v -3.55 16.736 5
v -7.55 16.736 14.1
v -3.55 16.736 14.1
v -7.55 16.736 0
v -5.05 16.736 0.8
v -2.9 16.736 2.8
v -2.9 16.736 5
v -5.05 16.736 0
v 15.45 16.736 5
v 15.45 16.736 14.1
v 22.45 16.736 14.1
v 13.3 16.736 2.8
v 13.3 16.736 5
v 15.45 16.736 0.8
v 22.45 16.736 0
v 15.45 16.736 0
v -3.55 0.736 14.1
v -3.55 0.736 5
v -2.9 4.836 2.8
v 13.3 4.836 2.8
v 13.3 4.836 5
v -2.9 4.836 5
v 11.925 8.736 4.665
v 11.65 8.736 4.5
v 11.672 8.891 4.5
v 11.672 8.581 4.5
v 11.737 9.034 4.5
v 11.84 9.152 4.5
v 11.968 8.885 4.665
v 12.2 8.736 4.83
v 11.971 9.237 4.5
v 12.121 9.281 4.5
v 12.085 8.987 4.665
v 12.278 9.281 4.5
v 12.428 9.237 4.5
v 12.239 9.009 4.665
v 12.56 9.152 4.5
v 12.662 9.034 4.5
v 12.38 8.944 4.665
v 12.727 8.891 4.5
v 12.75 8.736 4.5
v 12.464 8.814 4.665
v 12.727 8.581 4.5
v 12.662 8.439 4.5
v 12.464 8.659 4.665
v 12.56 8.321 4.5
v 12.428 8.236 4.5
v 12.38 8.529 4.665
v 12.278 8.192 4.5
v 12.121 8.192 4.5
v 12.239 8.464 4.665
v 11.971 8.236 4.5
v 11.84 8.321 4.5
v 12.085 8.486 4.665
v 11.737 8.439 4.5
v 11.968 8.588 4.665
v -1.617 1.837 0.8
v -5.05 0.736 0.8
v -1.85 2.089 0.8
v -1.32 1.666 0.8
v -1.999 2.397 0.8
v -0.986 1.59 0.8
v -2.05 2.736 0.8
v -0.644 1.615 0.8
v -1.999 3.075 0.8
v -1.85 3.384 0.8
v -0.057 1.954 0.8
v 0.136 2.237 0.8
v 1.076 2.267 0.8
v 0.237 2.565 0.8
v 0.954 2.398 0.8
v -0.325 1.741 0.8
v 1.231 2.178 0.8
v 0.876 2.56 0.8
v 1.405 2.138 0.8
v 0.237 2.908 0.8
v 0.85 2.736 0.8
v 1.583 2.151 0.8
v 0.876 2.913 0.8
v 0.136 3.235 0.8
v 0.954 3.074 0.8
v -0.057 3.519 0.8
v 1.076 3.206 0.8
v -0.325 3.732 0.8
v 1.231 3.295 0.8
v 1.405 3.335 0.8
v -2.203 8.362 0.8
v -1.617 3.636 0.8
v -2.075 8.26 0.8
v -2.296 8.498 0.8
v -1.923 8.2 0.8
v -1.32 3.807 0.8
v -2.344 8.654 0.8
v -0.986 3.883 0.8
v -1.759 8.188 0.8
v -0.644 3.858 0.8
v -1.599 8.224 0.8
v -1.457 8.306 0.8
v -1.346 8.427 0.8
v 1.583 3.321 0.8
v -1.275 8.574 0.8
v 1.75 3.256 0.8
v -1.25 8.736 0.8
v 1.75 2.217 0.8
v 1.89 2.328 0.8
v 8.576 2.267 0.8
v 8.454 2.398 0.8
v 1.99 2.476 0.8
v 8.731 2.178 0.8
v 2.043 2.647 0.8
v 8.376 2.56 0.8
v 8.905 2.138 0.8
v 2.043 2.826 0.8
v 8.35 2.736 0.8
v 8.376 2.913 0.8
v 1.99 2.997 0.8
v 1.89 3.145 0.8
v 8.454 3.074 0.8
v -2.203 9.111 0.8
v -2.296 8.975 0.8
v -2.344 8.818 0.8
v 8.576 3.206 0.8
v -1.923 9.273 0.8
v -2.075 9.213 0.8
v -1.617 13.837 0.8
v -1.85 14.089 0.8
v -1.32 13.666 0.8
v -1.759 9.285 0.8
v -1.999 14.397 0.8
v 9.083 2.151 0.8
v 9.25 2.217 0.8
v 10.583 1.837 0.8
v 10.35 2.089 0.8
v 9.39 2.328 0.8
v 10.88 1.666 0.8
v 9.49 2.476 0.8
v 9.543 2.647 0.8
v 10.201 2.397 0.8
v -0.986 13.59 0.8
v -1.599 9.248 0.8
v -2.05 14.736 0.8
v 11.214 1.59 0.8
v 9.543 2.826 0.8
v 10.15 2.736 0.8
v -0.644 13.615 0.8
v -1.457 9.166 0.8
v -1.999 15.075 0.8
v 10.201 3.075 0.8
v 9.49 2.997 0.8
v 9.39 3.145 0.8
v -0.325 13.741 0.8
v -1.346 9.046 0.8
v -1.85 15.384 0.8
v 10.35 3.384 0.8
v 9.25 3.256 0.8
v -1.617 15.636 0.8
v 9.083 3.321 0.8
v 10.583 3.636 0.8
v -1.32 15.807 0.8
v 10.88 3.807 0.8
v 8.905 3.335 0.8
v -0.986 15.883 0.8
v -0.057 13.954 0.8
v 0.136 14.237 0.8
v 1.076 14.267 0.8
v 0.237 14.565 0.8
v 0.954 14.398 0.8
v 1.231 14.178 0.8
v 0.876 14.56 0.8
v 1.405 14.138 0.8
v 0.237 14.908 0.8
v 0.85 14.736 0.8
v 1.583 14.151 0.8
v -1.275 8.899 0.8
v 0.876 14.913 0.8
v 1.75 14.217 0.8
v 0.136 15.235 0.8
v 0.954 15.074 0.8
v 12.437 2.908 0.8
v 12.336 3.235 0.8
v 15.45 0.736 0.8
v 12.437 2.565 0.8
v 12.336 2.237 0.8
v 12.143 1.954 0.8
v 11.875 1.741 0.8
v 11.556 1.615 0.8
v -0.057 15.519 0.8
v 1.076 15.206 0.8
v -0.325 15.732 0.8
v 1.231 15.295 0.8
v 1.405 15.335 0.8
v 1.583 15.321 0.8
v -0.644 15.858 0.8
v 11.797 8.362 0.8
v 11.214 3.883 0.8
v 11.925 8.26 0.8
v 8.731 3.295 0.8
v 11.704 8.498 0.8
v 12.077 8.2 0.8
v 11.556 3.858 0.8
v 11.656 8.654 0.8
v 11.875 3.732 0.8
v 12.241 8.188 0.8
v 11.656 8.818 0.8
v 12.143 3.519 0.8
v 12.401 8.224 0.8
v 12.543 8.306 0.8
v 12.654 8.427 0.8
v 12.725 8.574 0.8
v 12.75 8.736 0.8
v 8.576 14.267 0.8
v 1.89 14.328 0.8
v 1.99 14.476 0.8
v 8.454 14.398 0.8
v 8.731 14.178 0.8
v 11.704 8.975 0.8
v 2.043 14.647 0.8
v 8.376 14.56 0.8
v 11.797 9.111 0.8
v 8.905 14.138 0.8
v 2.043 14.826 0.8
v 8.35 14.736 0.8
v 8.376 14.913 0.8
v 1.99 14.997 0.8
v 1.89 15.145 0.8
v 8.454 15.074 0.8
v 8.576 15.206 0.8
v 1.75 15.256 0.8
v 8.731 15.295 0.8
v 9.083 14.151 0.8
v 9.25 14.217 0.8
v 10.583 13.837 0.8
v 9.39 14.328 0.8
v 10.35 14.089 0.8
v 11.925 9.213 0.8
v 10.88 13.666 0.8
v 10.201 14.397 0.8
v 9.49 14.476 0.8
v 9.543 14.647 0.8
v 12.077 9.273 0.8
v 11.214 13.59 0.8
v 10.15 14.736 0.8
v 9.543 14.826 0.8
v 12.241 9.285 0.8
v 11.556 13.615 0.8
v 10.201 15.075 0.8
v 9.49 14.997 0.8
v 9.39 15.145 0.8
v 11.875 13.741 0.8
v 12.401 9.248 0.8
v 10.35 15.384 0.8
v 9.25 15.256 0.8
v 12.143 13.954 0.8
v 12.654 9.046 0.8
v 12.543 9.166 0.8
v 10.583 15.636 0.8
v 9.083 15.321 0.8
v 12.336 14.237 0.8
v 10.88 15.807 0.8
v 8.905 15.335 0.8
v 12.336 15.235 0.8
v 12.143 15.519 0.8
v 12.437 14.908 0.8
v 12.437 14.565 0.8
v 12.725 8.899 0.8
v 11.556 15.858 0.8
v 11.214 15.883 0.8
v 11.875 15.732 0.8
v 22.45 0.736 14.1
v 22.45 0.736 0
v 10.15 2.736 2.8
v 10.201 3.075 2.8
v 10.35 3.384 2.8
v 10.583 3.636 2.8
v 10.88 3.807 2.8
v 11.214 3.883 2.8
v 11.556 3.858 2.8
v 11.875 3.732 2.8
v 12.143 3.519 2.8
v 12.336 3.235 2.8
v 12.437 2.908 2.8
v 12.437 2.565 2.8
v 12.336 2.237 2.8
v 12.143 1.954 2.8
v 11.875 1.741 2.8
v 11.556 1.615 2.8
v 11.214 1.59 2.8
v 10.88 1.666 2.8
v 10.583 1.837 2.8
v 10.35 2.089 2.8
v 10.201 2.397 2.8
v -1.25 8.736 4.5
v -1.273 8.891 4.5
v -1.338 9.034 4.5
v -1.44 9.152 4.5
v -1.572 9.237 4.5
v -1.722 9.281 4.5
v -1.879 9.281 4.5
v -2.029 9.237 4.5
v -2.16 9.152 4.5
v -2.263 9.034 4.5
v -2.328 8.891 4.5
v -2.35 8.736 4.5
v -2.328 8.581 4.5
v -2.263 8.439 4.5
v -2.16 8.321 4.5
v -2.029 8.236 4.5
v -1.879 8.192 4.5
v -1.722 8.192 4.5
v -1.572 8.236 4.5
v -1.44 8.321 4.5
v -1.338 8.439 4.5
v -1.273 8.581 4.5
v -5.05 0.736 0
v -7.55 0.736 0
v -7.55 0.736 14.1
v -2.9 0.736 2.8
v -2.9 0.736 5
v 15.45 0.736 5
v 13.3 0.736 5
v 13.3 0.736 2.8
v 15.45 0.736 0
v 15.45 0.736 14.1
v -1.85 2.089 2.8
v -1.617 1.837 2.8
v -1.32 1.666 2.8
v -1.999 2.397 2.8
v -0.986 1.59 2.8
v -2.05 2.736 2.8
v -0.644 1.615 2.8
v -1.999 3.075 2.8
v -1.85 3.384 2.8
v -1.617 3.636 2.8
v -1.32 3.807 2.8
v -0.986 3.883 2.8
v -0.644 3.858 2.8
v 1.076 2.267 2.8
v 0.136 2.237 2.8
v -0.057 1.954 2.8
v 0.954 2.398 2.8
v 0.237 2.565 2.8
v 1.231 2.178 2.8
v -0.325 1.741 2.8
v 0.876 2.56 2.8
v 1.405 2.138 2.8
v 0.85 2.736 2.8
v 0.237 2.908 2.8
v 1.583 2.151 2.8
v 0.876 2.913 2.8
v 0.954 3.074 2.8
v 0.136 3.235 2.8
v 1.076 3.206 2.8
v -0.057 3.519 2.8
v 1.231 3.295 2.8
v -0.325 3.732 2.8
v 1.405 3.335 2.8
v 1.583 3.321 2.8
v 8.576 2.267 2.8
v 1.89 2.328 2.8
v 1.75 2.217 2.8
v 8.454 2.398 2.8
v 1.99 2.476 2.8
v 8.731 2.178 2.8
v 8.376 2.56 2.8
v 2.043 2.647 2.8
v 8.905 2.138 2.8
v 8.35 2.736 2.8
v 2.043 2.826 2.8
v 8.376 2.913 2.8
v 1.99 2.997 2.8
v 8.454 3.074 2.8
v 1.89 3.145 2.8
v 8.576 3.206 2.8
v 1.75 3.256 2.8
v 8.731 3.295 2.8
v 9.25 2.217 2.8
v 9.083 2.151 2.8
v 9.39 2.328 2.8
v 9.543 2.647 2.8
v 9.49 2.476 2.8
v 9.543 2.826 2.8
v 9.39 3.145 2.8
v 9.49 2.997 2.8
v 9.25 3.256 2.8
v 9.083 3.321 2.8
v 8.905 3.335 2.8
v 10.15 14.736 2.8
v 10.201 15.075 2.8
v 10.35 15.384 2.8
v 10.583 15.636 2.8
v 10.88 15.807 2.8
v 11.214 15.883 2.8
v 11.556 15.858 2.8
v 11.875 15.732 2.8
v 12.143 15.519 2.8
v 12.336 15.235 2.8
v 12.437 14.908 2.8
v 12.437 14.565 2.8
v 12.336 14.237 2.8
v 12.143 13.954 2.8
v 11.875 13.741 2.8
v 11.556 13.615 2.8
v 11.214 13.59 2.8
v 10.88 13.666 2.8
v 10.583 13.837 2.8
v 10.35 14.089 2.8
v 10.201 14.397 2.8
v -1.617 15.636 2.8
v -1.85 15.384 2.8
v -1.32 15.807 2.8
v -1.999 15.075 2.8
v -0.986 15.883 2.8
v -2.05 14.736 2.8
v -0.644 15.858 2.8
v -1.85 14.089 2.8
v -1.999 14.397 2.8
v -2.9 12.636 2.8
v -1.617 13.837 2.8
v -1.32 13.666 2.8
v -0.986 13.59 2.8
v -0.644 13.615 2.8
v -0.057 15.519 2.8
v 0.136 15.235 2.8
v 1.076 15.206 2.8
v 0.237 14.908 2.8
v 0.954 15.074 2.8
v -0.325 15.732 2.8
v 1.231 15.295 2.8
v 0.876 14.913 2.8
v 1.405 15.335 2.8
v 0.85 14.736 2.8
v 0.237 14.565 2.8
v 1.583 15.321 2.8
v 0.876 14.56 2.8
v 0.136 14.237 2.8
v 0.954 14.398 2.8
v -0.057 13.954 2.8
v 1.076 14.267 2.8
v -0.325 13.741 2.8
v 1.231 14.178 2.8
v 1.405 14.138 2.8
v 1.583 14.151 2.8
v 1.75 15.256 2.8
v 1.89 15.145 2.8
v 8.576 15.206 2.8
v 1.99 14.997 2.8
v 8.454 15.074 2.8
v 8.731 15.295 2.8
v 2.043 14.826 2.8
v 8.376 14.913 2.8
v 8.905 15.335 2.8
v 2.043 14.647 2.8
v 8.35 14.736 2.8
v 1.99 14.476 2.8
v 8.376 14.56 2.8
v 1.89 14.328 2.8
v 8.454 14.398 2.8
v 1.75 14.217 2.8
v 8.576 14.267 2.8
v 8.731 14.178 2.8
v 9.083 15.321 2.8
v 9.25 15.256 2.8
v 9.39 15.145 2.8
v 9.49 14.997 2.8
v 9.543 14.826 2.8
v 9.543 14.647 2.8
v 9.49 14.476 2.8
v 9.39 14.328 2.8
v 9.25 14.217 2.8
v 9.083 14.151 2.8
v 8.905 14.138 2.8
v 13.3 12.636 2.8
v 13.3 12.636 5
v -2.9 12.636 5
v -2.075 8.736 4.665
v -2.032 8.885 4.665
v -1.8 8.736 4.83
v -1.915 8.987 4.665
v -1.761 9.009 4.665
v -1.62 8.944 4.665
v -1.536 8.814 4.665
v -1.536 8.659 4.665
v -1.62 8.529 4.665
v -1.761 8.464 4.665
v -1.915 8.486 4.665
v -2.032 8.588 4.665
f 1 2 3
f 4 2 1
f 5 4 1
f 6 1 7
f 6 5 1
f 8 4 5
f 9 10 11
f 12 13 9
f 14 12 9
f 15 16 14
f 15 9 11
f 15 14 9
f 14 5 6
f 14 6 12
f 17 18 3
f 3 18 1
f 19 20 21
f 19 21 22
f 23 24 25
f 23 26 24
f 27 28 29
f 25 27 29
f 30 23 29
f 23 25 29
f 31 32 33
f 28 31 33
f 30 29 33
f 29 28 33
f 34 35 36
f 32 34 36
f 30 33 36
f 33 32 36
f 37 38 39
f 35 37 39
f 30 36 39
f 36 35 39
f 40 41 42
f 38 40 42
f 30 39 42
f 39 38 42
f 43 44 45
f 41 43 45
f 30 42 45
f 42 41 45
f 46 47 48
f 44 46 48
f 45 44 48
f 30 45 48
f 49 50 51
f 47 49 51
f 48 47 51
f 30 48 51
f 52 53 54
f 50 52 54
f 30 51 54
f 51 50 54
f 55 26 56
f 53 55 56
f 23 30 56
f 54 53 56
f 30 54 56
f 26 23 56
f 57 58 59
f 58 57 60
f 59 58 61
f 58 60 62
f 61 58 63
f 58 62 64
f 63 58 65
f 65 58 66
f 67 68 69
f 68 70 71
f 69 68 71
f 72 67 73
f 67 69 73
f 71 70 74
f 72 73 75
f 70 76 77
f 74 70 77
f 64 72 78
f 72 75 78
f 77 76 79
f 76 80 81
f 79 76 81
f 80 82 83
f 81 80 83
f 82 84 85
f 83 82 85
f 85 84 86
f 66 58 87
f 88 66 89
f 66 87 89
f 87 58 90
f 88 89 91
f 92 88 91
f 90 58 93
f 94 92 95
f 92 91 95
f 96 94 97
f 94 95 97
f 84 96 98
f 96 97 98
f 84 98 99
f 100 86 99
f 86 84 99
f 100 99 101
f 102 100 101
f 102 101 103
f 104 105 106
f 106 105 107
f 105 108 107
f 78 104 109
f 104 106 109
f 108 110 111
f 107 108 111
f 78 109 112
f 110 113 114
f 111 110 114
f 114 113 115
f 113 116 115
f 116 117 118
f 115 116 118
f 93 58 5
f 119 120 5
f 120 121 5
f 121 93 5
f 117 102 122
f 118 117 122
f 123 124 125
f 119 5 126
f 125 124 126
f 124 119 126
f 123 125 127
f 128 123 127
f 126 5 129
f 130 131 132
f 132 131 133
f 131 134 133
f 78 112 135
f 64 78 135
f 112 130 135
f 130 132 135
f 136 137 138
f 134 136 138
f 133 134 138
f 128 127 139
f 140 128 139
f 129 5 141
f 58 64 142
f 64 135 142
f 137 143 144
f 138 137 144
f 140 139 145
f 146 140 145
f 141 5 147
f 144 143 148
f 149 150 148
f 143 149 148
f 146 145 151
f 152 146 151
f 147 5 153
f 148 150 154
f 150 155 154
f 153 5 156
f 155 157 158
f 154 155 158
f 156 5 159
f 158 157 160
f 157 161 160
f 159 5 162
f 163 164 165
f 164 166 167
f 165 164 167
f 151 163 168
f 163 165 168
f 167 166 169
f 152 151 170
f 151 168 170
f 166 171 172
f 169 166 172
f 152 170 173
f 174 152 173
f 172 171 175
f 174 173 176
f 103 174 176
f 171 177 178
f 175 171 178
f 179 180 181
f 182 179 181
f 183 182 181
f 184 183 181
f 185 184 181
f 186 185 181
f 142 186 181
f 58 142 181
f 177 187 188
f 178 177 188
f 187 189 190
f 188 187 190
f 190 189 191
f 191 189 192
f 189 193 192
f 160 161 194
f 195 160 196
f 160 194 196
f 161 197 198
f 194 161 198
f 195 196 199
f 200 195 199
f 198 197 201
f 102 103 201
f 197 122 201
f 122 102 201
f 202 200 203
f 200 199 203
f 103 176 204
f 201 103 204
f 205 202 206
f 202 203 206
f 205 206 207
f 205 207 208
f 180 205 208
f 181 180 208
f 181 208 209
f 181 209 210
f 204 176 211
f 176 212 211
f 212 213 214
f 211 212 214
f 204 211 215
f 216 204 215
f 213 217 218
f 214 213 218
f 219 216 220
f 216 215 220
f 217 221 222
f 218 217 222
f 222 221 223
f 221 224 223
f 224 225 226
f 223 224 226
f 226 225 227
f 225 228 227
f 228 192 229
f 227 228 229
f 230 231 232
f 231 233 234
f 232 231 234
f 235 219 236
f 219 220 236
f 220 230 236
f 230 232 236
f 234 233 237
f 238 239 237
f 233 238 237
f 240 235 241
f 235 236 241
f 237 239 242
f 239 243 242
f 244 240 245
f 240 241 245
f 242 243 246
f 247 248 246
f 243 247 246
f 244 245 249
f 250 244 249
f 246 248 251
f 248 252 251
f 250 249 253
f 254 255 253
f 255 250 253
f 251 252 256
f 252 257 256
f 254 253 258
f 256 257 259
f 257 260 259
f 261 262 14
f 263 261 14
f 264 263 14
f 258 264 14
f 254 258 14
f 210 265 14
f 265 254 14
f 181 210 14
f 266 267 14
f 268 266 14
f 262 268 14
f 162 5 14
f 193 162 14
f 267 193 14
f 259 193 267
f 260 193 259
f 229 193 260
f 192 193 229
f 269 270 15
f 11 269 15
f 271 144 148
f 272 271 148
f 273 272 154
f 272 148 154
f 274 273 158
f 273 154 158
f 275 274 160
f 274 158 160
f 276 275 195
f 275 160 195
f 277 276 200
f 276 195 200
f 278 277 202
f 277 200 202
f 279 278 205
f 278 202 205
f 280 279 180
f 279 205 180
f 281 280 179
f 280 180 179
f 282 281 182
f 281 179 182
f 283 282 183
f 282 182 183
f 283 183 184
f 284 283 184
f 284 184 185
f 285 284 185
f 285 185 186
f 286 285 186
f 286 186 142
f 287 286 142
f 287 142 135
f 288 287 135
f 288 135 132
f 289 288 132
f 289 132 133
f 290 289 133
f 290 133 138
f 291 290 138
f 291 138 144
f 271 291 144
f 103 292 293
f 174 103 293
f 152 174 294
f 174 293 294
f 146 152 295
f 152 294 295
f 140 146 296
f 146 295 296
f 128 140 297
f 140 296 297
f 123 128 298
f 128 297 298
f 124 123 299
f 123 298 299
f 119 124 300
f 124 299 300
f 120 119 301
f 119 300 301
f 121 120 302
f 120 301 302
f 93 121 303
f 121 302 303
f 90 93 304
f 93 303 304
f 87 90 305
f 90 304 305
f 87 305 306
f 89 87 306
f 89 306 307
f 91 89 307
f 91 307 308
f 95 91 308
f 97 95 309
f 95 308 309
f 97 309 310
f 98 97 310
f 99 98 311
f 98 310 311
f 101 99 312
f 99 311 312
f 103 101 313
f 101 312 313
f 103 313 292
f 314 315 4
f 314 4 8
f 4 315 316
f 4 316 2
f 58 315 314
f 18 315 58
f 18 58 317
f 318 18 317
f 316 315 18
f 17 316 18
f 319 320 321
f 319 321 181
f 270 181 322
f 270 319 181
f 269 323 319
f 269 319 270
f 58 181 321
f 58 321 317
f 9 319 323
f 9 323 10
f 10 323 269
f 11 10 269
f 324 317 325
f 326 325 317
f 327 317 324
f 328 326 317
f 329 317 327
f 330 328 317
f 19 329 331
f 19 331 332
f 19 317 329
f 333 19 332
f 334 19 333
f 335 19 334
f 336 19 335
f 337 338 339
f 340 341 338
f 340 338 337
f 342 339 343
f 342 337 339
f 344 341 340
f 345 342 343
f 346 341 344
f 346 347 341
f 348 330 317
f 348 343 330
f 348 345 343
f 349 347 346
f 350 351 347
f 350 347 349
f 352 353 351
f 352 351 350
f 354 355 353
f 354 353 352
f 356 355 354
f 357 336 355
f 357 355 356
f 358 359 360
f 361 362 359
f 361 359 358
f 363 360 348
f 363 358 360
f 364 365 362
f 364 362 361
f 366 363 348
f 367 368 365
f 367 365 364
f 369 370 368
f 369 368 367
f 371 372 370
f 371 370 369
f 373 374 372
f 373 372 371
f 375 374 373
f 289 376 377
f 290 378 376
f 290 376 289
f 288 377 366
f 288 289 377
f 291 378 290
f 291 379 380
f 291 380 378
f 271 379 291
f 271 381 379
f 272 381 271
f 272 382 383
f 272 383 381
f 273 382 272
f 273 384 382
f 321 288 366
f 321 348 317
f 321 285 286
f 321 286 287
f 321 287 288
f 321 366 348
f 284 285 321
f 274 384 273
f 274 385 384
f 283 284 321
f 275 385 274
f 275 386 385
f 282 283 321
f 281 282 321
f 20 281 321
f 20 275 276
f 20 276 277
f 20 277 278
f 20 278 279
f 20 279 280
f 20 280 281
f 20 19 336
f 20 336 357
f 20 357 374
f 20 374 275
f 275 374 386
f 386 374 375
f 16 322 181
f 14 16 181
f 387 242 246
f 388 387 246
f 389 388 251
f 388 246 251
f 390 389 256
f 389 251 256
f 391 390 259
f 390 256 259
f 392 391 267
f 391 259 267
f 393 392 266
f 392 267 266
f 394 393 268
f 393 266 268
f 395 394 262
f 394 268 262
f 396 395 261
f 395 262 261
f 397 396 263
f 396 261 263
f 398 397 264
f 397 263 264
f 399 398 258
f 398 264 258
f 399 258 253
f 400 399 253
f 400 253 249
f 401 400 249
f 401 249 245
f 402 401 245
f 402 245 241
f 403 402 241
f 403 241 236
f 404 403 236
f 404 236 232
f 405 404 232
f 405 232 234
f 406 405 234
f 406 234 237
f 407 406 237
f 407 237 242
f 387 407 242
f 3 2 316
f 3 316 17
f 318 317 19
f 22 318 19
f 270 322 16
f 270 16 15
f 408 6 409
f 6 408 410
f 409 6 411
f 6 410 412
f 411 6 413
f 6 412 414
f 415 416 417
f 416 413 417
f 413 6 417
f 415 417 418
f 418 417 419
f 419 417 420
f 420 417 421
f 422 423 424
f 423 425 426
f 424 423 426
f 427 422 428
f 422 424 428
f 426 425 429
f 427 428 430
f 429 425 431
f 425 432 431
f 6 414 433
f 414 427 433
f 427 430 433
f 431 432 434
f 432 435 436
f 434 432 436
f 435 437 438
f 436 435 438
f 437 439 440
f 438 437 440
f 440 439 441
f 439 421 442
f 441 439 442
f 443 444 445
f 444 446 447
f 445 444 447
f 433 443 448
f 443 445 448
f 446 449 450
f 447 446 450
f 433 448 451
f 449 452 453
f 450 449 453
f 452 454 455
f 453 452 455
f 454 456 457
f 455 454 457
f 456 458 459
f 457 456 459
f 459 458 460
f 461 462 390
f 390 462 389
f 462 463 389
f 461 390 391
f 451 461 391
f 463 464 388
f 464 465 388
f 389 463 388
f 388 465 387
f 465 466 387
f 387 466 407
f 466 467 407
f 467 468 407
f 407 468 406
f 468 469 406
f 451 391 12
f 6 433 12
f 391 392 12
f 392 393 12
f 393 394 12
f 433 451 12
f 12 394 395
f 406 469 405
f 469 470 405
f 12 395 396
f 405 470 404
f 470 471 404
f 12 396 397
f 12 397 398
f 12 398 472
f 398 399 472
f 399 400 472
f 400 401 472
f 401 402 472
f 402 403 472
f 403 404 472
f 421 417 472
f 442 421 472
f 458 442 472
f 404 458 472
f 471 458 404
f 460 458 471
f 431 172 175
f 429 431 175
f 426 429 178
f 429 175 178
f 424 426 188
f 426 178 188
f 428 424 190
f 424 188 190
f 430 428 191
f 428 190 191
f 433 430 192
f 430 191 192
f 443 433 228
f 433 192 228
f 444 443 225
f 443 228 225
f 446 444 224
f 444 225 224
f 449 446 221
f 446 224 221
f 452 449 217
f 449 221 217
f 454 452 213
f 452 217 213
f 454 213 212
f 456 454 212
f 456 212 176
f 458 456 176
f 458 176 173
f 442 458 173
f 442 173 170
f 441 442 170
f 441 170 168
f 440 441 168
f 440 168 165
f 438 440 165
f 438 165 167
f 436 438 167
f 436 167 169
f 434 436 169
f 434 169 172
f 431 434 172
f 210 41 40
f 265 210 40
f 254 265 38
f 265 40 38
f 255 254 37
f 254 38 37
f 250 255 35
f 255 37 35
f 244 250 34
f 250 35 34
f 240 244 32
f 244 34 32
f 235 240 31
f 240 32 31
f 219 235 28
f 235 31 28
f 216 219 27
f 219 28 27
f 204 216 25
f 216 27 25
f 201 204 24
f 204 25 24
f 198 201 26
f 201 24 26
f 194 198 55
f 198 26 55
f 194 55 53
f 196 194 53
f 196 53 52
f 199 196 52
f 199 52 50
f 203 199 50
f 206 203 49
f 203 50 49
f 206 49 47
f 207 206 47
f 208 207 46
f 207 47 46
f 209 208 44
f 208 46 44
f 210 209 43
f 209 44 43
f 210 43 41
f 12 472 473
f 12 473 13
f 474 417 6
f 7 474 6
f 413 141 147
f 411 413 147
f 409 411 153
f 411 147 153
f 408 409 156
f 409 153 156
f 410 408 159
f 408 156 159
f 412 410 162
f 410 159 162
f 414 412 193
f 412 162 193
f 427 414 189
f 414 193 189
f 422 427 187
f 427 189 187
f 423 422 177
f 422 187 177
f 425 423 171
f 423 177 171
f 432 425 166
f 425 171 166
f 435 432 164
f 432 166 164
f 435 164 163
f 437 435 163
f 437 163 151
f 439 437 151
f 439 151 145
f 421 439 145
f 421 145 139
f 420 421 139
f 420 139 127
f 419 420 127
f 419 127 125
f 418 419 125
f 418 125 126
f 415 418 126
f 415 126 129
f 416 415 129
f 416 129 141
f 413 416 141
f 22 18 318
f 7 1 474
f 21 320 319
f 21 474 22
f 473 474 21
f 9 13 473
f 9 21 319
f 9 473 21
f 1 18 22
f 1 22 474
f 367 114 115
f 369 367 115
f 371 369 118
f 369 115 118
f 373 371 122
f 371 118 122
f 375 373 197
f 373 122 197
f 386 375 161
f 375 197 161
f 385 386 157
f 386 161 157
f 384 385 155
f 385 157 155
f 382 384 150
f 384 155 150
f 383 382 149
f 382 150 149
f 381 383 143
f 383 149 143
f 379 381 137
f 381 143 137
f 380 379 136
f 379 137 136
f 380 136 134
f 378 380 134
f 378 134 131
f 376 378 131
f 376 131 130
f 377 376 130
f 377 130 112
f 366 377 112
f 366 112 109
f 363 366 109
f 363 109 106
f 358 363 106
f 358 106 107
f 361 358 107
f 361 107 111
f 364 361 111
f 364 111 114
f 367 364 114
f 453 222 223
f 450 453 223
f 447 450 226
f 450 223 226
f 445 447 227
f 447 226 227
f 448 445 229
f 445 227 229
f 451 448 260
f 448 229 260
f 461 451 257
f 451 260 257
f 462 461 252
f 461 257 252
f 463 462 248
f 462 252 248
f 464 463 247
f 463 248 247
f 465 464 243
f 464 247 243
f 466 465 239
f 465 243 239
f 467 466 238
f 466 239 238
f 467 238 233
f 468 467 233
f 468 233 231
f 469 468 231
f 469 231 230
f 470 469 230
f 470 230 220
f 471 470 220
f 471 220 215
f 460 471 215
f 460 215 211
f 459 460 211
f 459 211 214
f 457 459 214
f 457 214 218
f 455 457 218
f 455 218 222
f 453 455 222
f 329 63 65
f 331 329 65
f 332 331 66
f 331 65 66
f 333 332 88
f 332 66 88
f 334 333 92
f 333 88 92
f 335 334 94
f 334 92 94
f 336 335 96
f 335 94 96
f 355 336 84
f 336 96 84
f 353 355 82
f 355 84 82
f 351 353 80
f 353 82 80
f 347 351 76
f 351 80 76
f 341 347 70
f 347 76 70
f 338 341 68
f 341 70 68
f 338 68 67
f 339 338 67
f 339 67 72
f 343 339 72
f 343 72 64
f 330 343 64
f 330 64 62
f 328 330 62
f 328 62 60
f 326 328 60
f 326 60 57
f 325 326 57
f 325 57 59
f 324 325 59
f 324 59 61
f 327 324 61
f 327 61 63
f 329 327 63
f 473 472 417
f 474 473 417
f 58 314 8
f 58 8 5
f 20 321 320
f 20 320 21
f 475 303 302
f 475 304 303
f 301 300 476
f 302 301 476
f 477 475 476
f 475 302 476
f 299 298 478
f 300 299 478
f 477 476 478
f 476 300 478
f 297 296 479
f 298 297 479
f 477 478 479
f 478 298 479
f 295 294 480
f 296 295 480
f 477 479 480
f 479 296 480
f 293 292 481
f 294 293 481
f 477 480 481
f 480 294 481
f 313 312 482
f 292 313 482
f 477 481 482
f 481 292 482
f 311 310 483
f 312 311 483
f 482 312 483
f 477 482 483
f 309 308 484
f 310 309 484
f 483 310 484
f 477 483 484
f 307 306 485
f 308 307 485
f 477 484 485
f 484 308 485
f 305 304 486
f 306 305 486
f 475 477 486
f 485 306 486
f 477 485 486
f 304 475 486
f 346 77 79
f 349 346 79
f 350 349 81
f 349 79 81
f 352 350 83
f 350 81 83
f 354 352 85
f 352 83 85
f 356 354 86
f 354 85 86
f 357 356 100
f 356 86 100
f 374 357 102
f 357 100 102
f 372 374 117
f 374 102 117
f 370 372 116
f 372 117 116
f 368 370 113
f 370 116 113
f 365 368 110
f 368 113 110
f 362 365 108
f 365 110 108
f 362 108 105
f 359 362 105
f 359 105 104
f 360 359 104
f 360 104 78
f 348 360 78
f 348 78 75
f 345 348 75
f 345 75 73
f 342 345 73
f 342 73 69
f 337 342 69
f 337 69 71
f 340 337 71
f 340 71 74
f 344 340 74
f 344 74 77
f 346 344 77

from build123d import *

# Parameters (mm, degrees)
SKETCH_1_W           = 30
SKETCH_1_H           = 28
EXTRUDE_1_DEPTH      = 10
CUT_EXTRUDE_2_DEPTH  = 0.8
M1_4X0_3_2_D         = 1.1
M1_4X0_3_2_DEPTH     = 3.7
M1_4X0_3_2_TIP       = 0.33047334
SKETCH_12_W          = 30
SKETCH_12_H          = 4.25
CUT_EXTRUDE_5_DEPTH  = 10
SKETCH_14_W          = 23
SKETCH_14_H          = 23.75
CUT_EXTRUDE_7_DEPTH  = 5
SKETCH_23_W          = 4
SKETCH_23_H          = 23.75
EXTRUDE_4_DEPTH      = 9.1
SKETCH_31_W          = 7
SKETCH_31_H          = 23.75
EXTRUDE_6_DEPTH      = 4.1
SKETCH_32_W          = 30
SKETCH_32_H          = 7.75
CUT_EXTRUDE_13_DEPTH = 20
SKETCH_33_W          = 3
SKETCH_33_H          = 0.8
CUT_EXTRUDE_14_DEPTH = 10
SKETCH_24_W          = 16.2
SKETCH_24_H          = 4.1
CUT_EXTRUDE_10_DEPTH = 5
SKETCH_29_W          = 16.2
SKETCH_29_H          = 2
EXTRUDE_5_DEPTH      = 4.1
SKETCH_35_W          = 16.2
SKETCH_35_H          = 2
EXTRUDE_7_DEPTH      = 4.1
SKETCH_30_R          = 1.15
SKETCH_30_R_2        = 0.6
CUT_EXTRUDE_12_DEPTH = 5


with BuildPart() as part:
    # 草图1 → 凸台-拉伸1 (new body)
    with BuildSketch(Plane.XY):
        with Locations((7.449728974, 2.736434109)):
            Rectangle(SKETCH_1_W, SKETCH_1_H)
    extrude(amount=EXTRUDE_1_DEPTH)

    # 草图2 → 切除-拉伸2 (cut)
    with BuildSketch(Plane(origin=(0, 0, 0), x_dir=(-1, 0, 0), z_dir=(0, 0, -1))):
        with BuildLine():
            Line((5.050271026, 16.736434109), (-15.449728974, 16.736434109))
            Line((-15.449728974, 16.736434109), (-15.449728974, 3.736434109))
            ThreePointArc((-15.449728974, 3.736434109), (-14.571049317, 1.615113765), (-12.449728974, 0.736434109))
            Line((-12.449728974, 0.736434109), (2.050271026, 0.736434109))
            ThreePointArc((2.050271026, 0.736434109), (4.17159137, 1.615113765), (5.050271026, 3.736434109))
            Line((5.050271026, 3.736434109), (5.050271026, 16.736434109))
        make_face()
    extrude(amount=-CUT_EXTRUDE_2_DEPTH, mode=Mode.SUBTRACT)

    # M1.4x0.3 螺纹孔2
    with Locations(Plane(origin=(0, 0, 0.8), x_dir=(-1, 0, 0), z_dir=(0, 0, -1))):
        with Locations((-12.199728974, 8.736434109), (1.800271026, 8.736434109)):
            Hole(M1_4X0_3_2_D / 2, depth=M1_4X0_3_2_DEPTH)
            with Locations((0, 0, -(M1_4X0_3_2_DEPTH + M1_4X0_3_2_TIP / 2))):  # 118° drill point
                Cone(0, M1_4X0_3_2_D / 2, M1_4X0_3_2_TIP, mode=Mode.SUBTRACT)

    # 草图12 → 切除-拉伸5 (cut)
    with BuildSketch(Plane(origin=(0, 0, 0), x_dir=(-1, 0, 0), z_dir=(0, 0, -1))):
        with Locations((-7.449728974, -9.138565891)):
            Rectangle(SKETCH_12_W, SKETCH_12_H)
    extrude(amount=-CUT_EXTRUDE_5_DEPTH, mode=Mode.SUBTRACT)

    # 草图14 → 切除-拉伸7 (cut)
    with BuildSketch(Plane.XY.offset(10)):
        with Locations((3.949728974, 4.861434109)):
            Rectangle(SKETCH_14_W, SKETCH_14_H)
    extrude(amount=-CUT_EXTRUDE_7_DEPTH, mode=Mode.SUBTRACT)

    # 草图23 → 凸台-拉伸4 (add)
    with BuildSketch(Plane.XY.offset(5)):
        with Locations((-5.550271026, 4.861434109)):
            Rectangle(SKETCH_23_W, SKETCH_23_H)
    extrude(amount=EXTRUDE_4_DEPTH)

    # 草图31 → 凸台-拉伸6 (add)
    with BuildSketch(Plane.XY.offset(10)):
        with Locations((18.949728974, 4.861434109)):
            Rectangle(SKETCH_31_W, SKETCH_31_H)
    extrude(amount=EXTRUDE_6_DEPTH)

    # 草图32 → 切除-拉伸13 (cut)
    with BuildSketch(Plane(origin=(0, 0, 0), x_dir=(-1, 0, 0), z_dir=(0, 0, -1))):
        with Locations((-7.449728974, -3.138565891)):
            Rectangle(SKETCH_32_W, SKETCH_32_H)
    extrude(amount=-CUT_EXTRUDE_13_DEPTH, mode=Mode.SUBTRACT)

    # 草图33 → 切除-拉伸14 (cut)
    with BuildSketch(Plane.XZ.offset(-0.736434109)):
        with Locations((-3.550271026, 0.4)):
            Rectangle(SKETCH_33_W, SKETCH_33_H)
        with Locations((13.949728974, 0.4)):
            Rectangle(SKETCH_33_W, SKETCH_33_H)
    extrude(amount=-CUT_EXTRUDE_14_DEPTH, mode=Mode.SUBTRACT)

    # 草图24 → 切除-拉伸10 (cut)
    with BuildSketch(Plane(origin=(0, 0, 0.8), x_dir=(-1, 0, 0), z_dir=(0, 0, -1))):
        with Locations((-5.199728974, 14.686434109)):
            Rectangle(SKETCH_24_W, SKETCH_24_H)
        with Locations((-5.199728974, 2.786434109)):
            Rectangle(SKETCH_24_W, SKETCH_24_H)
    extrude(amount=-CUT_EXTRUDE_10_DEPTH, mode=Mode.SUBTRACT)

    # 草图29 → 凸台-拉伸5 (add)
    with BuildSketch(Plane(origin=(0, 12.636434109, 0), x_dir=(1, 0, 0), z_dir=(0, 1, 0))):
        with Locations((5.199728974, -1.8)):
            Rectangle(SKETCH_29_W, SKETCH_29_H)
    extrude(amount=EXTRUDE_5_DEPTH)

    # 草图35 → 凸台-拉伸7 (add)
    with BuildSketch(Plane.XZ.offset(-4.836434109)):
        with Locations((5.199728974, 1.8)):
            Rectangle(SKETCH_35_W, SKETCH_35_H)
    extrude(amount=EXTRUDE_7_DEPTH)

    # 草图30 → 切除-拉伸12 (cut)
    with BuildSketch(Plane(origin=(0, 0, 0.8), x_dir=(-1, 0, 0), z_dir=(0, 0, -1))):
        with Locations((0.900271026, 14.736434109)):
            Circle(SKETCH_30_R)
        with Locations((-11.299728974, 14.736434109)):
            Circle(SKETCH_30_R)
        with Locations((-8.949728974, 2.736434109)):
            Circle(SKETCH_30_R_2)
        with Locations((-1.449728974, 14.736434109)):
            Circle(SKETCH_30_R_2)
        with Locations((-8.949728974, 14.736434109)):
            Circle(SKETCH_30_R_2)
        with Locations((-1.449728974, 2.736434109)):
            Circle(SKETCH_30_R_2)
        with Locations((-11.299728974, 2.736434109)):
            Circle(SKETCH_30_R)
        with Locations((0.900271026, 2.736434109)):
            Circle(SKETCH_30_R)
    extrude(amount=-CUT_EXTRUDE_12_DEPTH, mode=Mode.SUBTRACT)


solid = part.part
